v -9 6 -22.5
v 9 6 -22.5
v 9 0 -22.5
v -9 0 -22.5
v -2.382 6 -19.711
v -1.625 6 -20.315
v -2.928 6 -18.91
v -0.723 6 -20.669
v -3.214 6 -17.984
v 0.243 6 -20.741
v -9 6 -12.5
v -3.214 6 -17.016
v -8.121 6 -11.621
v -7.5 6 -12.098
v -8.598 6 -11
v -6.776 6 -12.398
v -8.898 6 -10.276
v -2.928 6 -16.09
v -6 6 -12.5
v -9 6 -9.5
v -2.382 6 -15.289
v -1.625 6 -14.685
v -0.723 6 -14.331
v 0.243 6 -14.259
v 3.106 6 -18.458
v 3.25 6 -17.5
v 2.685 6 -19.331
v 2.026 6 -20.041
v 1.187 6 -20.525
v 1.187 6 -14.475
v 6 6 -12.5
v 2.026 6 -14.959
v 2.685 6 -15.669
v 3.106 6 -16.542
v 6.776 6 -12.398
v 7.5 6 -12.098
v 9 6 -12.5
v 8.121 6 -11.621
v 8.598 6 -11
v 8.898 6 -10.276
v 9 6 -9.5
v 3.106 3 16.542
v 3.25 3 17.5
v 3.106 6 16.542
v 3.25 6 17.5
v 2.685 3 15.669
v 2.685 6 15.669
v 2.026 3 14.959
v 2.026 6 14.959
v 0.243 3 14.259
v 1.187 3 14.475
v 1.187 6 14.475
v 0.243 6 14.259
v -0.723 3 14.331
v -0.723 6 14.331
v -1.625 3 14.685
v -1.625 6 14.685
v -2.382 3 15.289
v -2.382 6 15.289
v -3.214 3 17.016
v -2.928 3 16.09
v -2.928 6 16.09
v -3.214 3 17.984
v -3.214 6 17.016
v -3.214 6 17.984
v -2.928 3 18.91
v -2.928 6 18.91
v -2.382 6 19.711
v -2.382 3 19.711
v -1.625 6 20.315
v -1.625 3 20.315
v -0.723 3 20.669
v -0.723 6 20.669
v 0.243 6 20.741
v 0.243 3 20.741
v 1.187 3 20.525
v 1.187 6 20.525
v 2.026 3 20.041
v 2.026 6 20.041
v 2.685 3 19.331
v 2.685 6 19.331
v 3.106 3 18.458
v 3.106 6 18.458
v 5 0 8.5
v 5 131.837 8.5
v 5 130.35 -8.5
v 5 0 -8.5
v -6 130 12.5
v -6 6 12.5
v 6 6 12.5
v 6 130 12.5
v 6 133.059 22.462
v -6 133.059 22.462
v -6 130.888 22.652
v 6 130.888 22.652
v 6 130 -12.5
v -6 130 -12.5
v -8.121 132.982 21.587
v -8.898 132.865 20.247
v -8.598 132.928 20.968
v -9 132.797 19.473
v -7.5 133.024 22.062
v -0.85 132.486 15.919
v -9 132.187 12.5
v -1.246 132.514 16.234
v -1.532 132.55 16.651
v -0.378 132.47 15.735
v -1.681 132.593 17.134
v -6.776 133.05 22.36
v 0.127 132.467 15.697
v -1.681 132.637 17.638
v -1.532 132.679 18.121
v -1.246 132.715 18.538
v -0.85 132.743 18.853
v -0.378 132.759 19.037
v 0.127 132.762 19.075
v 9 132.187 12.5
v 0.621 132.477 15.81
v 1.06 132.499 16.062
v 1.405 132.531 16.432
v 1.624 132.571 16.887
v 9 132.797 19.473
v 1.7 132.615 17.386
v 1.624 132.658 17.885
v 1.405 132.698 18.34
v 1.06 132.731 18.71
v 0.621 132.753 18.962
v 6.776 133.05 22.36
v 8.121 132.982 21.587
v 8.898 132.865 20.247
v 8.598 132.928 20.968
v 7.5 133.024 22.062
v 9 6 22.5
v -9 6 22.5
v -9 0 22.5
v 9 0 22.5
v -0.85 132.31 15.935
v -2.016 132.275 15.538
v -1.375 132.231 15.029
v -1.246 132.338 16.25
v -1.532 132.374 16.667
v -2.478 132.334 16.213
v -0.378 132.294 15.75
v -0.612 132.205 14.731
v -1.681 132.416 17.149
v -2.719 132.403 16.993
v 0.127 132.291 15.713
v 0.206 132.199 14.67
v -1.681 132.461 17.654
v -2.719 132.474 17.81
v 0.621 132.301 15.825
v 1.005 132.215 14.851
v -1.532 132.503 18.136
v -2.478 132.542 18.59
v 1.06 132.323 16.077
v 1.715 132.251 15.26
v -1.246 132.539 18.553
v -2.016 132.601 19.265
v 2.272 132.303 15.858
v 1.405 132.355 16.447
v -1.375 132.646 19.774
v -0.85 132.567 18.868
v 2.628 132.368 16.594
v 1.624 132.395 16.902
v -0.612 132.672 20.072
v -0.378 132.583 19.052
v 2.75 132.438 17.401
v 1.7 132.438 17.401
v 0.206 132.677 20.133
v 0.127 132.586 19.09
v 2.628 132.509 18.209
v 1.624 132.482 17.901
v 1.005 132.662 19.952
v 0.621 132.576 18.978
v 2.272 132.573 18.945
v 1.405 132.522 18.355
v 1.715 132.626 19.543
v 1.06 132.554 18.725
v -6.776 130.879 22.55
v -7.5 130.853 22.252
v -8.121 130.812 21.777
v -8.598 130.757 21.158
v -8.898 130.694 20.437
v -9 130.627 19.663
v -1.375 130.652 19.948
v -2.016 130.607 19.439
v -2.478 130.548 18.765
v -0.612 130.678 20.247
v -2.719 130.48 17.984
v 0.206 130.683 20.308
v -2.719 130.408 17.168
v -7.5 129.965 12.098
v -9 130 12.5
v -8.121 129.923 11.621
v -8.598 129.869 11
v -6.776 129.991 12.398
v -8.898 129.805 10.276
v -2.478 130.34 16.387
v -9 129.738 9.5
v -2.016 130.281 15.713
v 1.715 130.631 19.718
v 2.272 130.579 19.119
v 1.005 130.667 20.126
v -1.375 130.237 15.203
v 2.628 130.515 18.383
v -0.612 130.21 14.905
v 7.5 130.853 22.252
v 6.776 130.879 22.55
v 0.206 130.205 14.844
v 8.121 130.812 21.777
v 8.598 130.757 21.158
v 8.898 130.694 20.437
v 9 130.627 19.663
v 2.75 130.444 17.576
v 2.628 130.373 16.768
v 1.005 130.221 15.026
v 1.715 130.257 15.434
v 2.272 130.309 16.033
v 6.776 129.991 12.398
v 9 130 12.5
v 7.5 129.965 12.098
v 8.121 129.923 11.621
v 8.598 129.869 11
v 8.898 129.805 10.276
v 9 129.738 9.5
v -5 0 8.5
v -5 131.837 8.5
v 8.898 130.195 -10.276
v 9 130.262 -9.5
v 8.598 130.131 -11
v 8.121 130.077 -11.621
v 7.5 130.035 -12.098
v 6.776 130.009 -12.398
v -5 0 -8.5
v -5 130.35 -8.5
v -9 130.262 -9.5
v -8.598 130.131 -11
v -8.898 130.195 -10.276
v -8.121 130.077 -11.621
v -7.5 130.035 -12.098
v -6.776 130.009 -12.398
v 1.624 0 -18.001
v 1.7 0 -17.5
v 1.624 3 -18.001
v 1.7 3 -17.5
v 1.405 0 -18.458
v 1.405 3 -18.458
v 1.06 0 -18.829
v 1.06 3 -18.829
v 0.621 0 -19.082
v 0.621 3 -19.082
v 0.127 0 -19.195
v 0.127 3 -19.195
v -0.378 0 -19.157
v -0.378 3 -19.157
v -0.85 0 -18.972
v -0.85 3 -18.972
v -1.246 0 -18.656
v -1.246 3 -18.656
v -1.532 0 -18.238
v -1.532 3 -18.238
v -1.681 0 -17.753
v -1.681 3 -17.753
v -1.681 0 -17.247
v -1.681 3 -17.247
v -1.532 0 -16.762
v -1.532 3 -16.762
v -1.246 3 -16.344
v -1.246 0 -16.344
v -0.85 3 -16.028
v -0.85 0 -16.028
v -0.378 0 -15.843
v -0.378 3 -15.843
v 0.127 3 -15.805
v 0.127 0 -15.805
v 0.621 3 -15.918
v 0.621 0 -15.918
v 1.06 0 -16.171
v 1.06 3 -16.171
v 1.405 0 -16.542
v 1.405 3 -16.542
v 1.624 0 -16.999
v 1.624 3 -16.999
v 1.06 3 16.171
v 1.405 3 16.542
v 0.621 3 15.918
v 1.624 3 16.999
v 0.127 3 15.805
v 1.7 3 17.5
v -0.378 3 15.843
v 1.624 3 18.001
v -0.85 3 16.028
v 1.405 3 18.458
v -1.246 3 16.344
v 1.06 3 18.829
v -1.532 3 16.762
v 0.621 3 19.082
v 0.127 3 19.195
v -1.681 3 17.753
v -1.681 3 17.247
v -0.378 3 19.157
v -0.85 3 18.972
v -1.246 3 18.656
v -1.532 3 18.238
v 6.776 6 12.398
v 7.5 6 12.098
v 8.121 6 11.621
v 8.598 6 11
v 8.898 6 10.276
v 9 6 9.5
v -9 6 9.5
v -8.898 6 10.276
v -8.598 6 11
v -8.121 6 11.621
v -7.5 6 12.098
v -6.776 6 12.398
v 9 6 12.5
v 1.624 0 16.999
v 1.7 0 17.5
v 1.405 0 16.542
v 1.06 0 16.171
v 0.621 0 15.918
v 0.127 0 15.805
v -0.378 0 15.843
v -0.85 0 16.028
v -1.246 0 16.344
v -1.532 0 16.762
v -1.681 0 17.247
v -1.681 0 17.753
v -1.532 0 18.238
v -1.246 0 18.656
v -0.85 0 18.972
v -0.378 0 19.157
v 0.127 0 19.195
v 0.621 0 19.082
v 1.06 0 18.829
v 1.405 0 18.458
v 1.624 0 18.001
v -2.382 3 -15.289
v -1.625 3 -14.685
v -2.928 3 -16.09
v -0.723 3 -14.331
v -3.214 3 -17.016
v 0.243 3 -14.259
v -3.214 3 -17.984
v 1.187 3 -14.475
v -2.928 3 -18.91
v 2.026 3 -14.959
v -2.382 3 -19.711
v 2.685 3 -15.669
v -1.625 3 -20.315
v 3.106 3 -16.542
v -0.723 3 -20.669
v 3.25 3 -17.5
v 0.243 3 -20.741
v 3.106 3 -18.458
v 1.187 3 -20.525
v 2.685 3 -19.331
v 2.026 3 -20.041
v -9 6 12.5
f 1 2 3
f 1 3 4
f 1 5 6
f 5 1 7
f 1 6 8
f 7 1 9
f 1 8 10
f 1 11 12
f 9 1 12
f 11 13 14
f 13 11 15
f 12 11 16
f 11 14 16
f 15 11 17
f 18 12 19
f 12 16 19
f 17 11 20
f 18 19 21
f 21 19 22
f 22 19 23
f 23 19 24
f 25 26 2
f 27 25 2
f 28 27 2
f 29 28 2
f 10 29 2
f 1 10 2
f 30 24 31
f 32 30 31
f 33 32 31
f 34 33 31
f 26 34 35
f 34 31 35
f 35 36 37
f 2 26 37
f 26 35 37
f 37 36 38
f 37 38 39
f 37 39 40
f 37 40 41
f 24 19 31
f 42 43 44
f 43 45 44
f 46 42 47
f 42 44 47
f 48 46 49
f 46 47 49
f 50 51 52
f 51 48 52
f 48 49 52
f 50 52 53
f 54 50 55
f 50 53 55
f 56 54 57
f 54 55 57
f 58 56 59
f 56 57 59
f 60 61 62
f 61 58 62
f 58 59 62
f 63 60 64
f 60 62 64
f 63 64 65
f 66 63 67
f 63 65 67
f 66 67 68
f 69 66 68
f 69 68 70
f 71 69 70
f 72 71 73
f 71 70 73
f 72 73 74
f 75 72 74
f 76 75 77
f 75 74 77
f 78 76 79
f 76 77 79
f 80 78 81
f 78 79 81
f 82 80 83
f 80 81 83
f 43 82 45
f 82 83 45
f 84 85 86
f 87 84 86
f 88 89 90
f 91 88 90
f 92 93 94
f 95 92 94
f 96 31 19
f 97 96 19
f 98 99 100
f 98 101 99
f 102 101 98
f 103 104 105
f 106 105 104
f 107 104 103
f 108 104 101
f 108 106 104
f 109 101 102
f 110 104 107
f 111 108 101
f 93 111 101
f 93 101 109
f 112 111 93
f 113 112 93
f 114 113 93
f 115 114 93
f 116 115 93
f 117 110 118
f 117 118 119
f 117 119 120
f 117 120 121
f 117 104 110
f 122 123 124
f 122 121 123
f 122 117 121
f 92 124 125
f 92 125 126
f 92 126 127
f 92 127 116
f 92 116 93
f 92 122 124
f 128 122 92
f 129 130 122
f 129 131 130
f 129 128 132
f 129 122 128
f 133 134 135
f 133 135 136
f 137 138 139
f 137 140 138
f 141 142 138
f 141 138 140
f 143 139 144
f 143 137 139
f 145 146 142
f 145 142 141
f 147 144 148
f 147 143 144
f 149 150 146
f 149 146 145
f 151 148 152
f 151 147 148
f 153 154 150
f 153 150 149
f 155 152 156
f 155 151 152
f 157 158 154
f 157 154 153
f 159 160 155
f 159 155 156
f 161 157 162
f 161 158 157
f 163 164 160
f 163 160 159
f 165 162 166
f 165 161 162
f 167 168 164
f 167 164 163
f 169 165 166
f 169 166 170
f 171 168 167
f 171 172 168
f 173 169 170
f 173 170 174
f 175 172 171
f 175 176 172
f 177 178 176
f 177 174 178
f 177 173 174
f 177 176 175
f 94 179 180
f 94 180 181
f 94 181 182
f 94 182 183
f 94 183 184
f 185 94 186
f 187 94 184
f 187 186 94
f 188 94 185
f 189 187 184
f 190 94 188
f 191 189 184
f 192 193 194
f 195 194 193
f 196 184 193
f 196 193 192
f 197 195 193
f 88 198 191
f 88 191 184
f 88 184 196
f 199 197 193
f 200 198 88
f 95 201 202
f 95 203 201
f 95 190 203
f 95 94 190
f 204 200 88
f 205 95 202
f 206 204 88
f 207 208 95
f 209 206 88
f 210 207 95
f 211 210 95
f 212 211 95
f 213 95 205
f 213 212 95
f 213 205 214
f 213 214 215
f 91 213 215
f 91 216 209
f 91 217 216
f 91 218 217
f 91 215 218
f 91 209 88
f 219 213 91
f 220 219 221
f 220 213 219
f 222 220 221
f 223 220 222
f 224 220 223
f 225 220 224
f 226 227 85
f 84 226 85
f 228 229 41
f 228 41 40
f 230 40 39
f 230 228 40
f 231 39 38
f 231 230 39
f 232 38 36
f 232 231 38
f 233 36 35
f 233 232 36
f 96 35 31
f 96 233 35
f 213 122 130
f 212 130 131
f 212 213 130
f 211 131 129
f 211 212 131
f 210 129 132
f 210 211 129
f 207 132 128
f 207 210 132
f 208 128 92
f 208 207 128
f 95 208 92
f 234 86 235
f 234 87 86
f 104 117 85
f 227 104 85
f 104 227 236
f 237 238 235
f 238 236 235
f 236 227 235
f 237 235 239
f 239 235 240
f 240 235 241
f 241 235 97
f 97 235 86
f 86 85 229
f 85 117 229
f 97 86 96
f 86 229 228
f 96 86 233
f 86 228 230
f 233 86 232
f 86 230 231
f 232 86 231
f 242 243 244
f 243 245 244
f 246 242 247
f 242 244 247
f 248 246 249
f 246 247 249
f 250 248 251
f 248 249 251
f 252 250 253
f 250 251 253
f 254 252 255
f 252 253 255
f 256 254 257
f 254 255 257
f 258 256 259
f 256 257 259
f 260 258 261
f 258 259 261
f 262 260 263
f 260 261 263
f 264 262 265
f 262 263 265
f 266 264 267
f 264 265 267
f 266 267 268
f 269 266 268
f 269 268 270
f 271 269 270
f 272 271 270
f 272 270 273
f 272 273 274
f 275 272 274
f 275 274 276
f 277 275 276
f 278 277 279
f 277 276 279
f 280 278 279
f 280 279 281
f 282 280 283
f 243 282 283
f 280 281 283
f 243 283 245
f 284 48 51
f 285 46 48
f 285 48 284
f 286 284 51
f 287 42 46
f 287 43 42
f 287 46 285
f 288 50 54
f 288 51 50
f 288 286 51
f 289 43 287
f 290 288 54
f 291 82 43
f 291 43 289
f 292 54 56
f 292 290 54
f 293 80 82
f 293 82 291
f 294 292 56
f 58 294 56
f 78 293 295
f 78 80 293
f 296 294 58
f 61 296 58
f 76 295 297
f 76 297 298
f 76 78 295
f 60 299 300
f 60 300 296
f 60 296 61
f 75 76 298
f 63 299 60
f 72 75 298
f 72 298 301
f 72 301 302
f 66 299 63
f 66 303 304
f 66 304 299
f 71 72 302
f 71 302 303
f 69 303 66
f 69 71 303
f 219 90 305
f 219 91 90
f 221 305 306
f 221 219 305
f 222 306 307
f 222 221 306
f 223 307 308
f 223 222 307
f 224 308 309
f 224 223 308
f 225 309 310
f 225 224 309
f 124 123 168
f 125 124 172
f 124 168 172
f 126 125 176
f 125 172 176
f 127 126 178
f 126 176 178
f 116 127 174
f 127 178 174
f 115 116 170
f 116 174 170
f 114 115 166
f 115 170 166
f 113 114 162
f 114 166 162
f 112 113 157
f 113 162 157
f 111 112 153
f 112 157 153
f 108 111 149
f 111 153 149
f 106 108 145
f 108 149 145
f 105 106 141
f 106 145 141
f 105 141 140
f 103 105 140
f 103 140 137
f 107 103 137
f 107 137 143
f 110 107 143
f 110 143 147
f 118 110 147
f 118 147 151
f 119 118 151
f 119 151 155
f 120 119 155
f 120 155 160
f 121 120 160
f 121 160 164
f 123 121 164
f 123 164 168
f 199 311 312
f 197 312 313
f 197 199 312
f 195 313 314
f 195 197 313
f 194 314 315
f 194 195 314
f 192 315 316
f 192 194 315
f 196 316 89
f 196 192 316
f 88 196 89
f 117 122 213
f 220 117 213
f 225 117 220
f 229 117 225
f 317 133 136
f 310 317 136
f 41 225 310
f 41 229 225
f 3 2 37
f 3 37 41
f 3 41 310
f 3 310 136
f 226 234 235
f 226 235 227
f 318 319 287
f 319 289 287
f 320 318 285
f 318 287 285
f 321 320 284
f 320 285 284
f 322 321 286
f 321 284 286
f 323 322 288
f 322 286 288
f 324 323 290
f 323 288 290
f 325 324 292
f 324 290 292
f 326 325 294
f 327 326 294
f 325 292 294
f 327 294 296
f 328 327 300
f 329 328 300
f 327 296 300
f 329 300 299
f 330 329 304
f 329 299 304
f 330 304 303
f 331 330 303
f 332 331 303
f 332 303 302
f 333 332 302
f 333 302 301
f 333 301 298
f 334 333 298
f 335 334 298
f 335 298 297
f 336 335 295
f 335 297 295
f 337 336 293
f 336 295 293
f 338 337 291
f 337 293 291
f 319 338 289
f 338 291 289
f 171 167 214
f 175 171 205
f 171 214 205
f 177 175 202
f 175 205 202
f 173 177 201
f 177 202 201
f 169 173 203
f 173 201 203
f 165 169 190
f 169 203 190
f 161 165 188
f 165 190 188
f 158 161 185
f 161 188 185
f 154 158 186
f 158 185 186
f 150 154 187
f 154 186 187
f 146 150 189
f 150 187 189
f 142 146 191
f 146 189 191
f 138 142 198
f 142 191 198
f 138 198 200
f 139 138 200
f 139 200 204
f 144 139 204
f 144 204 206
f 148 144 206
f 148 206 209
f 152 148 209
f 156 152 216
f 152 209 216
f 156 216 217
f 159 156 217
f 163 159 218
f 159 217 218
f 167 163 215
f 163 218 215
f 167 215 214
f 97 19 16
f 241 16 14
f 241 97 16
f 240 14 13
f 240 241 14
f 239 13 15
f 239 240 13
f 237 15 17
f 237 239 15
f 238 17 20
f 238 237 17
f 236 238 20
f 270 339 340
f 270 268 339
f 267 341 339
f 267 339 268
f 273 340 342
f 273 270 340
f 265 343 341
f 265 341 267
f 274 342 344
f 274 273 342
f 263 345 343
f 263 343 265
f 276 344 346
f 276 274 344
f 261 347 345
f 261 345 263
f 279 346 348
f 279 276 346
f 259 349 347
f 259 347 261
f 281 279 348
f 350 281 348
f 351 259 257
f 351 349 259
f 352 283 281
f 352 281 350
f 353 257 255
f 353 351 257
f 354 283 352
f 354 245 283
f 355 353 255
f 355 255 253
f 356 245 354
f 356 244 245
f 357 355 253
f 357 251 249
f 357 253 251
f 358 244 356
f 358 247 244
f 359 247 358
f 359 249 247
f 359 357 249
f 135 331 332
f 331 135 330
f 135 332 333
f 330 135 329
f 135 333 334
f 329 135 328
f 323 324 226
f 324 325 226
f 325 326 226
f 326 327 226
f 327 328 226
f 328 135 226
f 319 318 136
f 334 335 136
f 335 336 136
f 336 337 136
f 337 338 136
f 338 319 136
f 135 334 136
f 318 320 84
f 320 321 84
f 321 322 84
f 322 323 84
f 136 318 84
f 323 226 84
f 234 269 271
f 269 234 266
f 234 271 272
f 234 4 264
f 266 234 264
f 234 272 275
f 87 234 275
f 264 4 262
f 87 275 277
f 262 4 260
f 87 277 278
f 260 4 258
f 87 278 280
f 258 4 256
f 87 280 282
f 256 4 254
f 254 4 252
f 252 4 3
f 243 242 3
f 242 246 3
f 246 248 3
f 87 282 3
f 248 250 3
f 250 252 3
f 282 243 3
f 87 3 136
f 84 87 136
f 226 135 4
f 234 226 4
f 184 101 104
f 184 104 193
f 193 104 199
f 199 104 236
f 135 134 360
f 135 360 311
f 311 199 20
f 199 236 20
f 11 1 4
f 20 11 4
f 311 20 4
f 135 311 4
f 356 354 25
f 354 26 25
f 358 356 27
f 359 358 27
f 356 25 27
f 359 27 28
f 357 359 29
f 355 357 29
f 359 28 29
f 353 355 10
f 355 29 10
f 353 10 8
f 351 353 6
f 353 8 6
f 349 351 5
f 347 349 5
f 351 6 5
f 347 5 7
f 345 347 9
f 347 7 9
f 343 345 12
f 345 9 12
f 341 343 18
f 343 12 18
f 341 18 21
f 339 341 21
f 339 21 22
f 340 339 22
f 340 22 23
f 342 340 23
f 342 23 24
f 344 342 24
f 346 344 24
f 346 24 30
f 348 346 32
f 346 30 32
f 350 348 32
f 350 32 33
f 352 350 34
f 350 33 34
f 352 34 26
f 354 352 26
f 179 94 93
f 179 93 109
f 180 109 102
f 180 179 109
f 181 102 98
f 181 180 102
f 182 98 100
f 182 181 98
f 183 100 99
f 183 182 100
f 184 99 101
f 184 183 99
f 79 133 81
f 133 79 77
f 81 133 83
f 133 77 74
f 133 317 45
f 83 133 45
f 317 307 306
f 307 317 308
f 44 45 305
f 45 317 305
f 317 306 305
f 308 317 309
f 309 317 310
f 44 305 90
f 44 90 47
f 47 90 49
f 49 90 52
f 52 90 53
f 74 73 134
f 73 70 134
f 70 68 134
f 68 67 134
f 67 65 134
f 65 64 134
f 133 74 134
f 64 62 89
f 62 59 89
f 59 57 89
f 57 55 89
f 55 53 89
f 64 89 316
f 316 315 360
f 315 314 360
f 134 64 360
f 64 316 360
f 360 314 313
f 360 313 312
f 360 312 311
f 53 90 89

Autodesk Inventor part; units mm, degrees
ref_plane "YZ Plane" through (0, 0, 0) normal (1, 0, 0) x (0, 1, 0)
ref_plane "XZ Plane" through (0, 0, 0) normal (0, 1, 0) x (-1, 0, 0)
ref_plane "XY Plane" through (0, 0, 0) normal (0, 0, 1) x (1, 0, 0)
sketch "Sketch2" plane through (0, 0, 0) normal (0, 1, 0) x (-1, 0, 0)
  line L0 (5, 8.5) -> (-5, 8.5)
  line L1 (-5, 8.5) -> (-5, -8.5)
  line L2 (-5, -8.5) -> (5, -8.5)
  line L3 (5, -8.5) -> (5, 8.5)
  line L4 (5, 8.5) -> (-5, -8.5) construction
  line L5 (-5, 8.5) -> (5, -8.5) construction
  line L6 (9, 12.5) -> (-9, 12.5)
  line L7 (-9, 12.5) -> (-9, -12.5)
  line L8 (-9, -12.5) -> (9, -12.5)
  line L9 (9, -12.5) -> (9, 12.5)
  point P0 (0, 0)
  dimension "d0" = 17
  dimension "d1" = 10
  dimension "d2" = 4
extrude "Extrusion1" add sketch "Sketch2" along normal blind 130
sketch "Sketch3" plane through (9, 0, -12.5) normal (0, 0, -1) x (-1, 0, 0)
  line L0 (0, 0) -> (0, 130) projected
  line L1 (18, 0) -> (18, 130) projected
  line L2 (0, 0) -> (18, 0)
  line L3 (18, 0) -> (18, 6)
  line L4 (18, 6) -> (0, 6)
  line L5 (0, 6) -> (0, 0)
  point P0 (9, 0)
  point P1 (0, 6)
  dimension "d5" = 6
extrude "Extrusion2" add sketch "Sketch3" along normal blind 10
sketch "Sketch4" plane through (-9, 6, -12.5) normal (0, 1, 0) x (1, 0, 0)
  circle A0 centre (9, 5) radius 3.25
  circle A1 centre (9, 5) radius 1.7
  line L0 (0, 0) -> (0, 10) projected
  line L1 (0, 10) -> (18, 10) projected
  point P0 (9, -12.5)
  point P1 (0, 5)
  point P2 (9, 10)
  dimension "d8" = 6.5
  dimension "d9" = 3.4
extrude "Extrusion3" cut sketch "Sketch4" against normal blind 10 contours A1
extrude "Extrusion4" cut sketch "Sketch4" against normal blind 3
sketch "Sketch5" plane through (9, 0, 12.5) normal (1, 0, 0) x (0, 0, -1)
  line L0 (0, 0) -> (0, 130) projected
  line L1 (0, 130) -> (0, 132.1872)
  line L2 (25, 130) -> (0, 130) projected
  line L3 (0, 132.1872) -> (25, 130)
  line L4 (0, 132.1872) -> (-9.9619, 133.0588)
  line L5 (-9.9619, 133.0588) -> (-10.1519, 130.8882)
  line L6 (-10.1519, 130.8882) -> (0, 130)
  line L7 (25, 6) -> (25, 130) projected
  point P0 (12.5, 0)
  dimension "d14" = 5
  dimension "d18" = 10
extrude "Extrusion5" add sketch "Sketch5" against normal up to surface (18 mm away)
extrude "Extrusion6" cut sketch "Sketch2" along normal through all contours L3 L2 L1 L0
sketch "Sketch6" plane through (-9, 130, 12.5) normal (0, -0.9961947, 0.0871557) x (1, 0, 0)
  circle A0 centre (9, 5.0953) radius 2.75
  circle A1 centre (9, 5.0953) radius 1.7
  line L0 (0, 10.1906) -> (0, 0) projected
  line L1 (18, 10.1906) -> (0, 10.1906) projected
  point P0 (9, -23.7827)
  point P1 (0, 5.0953)
  point P2 (9, 10.1906)
  dimension "d23" = 5.5
  dimension "d24" = 3.4
extrude "Extrusion7" cut sketch "Sketch6" against normal blind 10 contours A1
extrude "Extrusion8" cut sketch "Sketch6" against normal blind 2
mirror "Mirror1" about plane through (0, 0, 0) normal (0, 0, 1) of "Extrusion2", "Extrusion3", "Extrusion4"
fillet "Fillet1" radius 3 6 edges at (9, 68, -12.5) (-9, 68, -12.5) (9, 68, 12.5) (-9, 68, 12.5) (9, 131.9735, 22.5569) (-9, 131.9735, 22.5569)
properties part number "Path Holder"
